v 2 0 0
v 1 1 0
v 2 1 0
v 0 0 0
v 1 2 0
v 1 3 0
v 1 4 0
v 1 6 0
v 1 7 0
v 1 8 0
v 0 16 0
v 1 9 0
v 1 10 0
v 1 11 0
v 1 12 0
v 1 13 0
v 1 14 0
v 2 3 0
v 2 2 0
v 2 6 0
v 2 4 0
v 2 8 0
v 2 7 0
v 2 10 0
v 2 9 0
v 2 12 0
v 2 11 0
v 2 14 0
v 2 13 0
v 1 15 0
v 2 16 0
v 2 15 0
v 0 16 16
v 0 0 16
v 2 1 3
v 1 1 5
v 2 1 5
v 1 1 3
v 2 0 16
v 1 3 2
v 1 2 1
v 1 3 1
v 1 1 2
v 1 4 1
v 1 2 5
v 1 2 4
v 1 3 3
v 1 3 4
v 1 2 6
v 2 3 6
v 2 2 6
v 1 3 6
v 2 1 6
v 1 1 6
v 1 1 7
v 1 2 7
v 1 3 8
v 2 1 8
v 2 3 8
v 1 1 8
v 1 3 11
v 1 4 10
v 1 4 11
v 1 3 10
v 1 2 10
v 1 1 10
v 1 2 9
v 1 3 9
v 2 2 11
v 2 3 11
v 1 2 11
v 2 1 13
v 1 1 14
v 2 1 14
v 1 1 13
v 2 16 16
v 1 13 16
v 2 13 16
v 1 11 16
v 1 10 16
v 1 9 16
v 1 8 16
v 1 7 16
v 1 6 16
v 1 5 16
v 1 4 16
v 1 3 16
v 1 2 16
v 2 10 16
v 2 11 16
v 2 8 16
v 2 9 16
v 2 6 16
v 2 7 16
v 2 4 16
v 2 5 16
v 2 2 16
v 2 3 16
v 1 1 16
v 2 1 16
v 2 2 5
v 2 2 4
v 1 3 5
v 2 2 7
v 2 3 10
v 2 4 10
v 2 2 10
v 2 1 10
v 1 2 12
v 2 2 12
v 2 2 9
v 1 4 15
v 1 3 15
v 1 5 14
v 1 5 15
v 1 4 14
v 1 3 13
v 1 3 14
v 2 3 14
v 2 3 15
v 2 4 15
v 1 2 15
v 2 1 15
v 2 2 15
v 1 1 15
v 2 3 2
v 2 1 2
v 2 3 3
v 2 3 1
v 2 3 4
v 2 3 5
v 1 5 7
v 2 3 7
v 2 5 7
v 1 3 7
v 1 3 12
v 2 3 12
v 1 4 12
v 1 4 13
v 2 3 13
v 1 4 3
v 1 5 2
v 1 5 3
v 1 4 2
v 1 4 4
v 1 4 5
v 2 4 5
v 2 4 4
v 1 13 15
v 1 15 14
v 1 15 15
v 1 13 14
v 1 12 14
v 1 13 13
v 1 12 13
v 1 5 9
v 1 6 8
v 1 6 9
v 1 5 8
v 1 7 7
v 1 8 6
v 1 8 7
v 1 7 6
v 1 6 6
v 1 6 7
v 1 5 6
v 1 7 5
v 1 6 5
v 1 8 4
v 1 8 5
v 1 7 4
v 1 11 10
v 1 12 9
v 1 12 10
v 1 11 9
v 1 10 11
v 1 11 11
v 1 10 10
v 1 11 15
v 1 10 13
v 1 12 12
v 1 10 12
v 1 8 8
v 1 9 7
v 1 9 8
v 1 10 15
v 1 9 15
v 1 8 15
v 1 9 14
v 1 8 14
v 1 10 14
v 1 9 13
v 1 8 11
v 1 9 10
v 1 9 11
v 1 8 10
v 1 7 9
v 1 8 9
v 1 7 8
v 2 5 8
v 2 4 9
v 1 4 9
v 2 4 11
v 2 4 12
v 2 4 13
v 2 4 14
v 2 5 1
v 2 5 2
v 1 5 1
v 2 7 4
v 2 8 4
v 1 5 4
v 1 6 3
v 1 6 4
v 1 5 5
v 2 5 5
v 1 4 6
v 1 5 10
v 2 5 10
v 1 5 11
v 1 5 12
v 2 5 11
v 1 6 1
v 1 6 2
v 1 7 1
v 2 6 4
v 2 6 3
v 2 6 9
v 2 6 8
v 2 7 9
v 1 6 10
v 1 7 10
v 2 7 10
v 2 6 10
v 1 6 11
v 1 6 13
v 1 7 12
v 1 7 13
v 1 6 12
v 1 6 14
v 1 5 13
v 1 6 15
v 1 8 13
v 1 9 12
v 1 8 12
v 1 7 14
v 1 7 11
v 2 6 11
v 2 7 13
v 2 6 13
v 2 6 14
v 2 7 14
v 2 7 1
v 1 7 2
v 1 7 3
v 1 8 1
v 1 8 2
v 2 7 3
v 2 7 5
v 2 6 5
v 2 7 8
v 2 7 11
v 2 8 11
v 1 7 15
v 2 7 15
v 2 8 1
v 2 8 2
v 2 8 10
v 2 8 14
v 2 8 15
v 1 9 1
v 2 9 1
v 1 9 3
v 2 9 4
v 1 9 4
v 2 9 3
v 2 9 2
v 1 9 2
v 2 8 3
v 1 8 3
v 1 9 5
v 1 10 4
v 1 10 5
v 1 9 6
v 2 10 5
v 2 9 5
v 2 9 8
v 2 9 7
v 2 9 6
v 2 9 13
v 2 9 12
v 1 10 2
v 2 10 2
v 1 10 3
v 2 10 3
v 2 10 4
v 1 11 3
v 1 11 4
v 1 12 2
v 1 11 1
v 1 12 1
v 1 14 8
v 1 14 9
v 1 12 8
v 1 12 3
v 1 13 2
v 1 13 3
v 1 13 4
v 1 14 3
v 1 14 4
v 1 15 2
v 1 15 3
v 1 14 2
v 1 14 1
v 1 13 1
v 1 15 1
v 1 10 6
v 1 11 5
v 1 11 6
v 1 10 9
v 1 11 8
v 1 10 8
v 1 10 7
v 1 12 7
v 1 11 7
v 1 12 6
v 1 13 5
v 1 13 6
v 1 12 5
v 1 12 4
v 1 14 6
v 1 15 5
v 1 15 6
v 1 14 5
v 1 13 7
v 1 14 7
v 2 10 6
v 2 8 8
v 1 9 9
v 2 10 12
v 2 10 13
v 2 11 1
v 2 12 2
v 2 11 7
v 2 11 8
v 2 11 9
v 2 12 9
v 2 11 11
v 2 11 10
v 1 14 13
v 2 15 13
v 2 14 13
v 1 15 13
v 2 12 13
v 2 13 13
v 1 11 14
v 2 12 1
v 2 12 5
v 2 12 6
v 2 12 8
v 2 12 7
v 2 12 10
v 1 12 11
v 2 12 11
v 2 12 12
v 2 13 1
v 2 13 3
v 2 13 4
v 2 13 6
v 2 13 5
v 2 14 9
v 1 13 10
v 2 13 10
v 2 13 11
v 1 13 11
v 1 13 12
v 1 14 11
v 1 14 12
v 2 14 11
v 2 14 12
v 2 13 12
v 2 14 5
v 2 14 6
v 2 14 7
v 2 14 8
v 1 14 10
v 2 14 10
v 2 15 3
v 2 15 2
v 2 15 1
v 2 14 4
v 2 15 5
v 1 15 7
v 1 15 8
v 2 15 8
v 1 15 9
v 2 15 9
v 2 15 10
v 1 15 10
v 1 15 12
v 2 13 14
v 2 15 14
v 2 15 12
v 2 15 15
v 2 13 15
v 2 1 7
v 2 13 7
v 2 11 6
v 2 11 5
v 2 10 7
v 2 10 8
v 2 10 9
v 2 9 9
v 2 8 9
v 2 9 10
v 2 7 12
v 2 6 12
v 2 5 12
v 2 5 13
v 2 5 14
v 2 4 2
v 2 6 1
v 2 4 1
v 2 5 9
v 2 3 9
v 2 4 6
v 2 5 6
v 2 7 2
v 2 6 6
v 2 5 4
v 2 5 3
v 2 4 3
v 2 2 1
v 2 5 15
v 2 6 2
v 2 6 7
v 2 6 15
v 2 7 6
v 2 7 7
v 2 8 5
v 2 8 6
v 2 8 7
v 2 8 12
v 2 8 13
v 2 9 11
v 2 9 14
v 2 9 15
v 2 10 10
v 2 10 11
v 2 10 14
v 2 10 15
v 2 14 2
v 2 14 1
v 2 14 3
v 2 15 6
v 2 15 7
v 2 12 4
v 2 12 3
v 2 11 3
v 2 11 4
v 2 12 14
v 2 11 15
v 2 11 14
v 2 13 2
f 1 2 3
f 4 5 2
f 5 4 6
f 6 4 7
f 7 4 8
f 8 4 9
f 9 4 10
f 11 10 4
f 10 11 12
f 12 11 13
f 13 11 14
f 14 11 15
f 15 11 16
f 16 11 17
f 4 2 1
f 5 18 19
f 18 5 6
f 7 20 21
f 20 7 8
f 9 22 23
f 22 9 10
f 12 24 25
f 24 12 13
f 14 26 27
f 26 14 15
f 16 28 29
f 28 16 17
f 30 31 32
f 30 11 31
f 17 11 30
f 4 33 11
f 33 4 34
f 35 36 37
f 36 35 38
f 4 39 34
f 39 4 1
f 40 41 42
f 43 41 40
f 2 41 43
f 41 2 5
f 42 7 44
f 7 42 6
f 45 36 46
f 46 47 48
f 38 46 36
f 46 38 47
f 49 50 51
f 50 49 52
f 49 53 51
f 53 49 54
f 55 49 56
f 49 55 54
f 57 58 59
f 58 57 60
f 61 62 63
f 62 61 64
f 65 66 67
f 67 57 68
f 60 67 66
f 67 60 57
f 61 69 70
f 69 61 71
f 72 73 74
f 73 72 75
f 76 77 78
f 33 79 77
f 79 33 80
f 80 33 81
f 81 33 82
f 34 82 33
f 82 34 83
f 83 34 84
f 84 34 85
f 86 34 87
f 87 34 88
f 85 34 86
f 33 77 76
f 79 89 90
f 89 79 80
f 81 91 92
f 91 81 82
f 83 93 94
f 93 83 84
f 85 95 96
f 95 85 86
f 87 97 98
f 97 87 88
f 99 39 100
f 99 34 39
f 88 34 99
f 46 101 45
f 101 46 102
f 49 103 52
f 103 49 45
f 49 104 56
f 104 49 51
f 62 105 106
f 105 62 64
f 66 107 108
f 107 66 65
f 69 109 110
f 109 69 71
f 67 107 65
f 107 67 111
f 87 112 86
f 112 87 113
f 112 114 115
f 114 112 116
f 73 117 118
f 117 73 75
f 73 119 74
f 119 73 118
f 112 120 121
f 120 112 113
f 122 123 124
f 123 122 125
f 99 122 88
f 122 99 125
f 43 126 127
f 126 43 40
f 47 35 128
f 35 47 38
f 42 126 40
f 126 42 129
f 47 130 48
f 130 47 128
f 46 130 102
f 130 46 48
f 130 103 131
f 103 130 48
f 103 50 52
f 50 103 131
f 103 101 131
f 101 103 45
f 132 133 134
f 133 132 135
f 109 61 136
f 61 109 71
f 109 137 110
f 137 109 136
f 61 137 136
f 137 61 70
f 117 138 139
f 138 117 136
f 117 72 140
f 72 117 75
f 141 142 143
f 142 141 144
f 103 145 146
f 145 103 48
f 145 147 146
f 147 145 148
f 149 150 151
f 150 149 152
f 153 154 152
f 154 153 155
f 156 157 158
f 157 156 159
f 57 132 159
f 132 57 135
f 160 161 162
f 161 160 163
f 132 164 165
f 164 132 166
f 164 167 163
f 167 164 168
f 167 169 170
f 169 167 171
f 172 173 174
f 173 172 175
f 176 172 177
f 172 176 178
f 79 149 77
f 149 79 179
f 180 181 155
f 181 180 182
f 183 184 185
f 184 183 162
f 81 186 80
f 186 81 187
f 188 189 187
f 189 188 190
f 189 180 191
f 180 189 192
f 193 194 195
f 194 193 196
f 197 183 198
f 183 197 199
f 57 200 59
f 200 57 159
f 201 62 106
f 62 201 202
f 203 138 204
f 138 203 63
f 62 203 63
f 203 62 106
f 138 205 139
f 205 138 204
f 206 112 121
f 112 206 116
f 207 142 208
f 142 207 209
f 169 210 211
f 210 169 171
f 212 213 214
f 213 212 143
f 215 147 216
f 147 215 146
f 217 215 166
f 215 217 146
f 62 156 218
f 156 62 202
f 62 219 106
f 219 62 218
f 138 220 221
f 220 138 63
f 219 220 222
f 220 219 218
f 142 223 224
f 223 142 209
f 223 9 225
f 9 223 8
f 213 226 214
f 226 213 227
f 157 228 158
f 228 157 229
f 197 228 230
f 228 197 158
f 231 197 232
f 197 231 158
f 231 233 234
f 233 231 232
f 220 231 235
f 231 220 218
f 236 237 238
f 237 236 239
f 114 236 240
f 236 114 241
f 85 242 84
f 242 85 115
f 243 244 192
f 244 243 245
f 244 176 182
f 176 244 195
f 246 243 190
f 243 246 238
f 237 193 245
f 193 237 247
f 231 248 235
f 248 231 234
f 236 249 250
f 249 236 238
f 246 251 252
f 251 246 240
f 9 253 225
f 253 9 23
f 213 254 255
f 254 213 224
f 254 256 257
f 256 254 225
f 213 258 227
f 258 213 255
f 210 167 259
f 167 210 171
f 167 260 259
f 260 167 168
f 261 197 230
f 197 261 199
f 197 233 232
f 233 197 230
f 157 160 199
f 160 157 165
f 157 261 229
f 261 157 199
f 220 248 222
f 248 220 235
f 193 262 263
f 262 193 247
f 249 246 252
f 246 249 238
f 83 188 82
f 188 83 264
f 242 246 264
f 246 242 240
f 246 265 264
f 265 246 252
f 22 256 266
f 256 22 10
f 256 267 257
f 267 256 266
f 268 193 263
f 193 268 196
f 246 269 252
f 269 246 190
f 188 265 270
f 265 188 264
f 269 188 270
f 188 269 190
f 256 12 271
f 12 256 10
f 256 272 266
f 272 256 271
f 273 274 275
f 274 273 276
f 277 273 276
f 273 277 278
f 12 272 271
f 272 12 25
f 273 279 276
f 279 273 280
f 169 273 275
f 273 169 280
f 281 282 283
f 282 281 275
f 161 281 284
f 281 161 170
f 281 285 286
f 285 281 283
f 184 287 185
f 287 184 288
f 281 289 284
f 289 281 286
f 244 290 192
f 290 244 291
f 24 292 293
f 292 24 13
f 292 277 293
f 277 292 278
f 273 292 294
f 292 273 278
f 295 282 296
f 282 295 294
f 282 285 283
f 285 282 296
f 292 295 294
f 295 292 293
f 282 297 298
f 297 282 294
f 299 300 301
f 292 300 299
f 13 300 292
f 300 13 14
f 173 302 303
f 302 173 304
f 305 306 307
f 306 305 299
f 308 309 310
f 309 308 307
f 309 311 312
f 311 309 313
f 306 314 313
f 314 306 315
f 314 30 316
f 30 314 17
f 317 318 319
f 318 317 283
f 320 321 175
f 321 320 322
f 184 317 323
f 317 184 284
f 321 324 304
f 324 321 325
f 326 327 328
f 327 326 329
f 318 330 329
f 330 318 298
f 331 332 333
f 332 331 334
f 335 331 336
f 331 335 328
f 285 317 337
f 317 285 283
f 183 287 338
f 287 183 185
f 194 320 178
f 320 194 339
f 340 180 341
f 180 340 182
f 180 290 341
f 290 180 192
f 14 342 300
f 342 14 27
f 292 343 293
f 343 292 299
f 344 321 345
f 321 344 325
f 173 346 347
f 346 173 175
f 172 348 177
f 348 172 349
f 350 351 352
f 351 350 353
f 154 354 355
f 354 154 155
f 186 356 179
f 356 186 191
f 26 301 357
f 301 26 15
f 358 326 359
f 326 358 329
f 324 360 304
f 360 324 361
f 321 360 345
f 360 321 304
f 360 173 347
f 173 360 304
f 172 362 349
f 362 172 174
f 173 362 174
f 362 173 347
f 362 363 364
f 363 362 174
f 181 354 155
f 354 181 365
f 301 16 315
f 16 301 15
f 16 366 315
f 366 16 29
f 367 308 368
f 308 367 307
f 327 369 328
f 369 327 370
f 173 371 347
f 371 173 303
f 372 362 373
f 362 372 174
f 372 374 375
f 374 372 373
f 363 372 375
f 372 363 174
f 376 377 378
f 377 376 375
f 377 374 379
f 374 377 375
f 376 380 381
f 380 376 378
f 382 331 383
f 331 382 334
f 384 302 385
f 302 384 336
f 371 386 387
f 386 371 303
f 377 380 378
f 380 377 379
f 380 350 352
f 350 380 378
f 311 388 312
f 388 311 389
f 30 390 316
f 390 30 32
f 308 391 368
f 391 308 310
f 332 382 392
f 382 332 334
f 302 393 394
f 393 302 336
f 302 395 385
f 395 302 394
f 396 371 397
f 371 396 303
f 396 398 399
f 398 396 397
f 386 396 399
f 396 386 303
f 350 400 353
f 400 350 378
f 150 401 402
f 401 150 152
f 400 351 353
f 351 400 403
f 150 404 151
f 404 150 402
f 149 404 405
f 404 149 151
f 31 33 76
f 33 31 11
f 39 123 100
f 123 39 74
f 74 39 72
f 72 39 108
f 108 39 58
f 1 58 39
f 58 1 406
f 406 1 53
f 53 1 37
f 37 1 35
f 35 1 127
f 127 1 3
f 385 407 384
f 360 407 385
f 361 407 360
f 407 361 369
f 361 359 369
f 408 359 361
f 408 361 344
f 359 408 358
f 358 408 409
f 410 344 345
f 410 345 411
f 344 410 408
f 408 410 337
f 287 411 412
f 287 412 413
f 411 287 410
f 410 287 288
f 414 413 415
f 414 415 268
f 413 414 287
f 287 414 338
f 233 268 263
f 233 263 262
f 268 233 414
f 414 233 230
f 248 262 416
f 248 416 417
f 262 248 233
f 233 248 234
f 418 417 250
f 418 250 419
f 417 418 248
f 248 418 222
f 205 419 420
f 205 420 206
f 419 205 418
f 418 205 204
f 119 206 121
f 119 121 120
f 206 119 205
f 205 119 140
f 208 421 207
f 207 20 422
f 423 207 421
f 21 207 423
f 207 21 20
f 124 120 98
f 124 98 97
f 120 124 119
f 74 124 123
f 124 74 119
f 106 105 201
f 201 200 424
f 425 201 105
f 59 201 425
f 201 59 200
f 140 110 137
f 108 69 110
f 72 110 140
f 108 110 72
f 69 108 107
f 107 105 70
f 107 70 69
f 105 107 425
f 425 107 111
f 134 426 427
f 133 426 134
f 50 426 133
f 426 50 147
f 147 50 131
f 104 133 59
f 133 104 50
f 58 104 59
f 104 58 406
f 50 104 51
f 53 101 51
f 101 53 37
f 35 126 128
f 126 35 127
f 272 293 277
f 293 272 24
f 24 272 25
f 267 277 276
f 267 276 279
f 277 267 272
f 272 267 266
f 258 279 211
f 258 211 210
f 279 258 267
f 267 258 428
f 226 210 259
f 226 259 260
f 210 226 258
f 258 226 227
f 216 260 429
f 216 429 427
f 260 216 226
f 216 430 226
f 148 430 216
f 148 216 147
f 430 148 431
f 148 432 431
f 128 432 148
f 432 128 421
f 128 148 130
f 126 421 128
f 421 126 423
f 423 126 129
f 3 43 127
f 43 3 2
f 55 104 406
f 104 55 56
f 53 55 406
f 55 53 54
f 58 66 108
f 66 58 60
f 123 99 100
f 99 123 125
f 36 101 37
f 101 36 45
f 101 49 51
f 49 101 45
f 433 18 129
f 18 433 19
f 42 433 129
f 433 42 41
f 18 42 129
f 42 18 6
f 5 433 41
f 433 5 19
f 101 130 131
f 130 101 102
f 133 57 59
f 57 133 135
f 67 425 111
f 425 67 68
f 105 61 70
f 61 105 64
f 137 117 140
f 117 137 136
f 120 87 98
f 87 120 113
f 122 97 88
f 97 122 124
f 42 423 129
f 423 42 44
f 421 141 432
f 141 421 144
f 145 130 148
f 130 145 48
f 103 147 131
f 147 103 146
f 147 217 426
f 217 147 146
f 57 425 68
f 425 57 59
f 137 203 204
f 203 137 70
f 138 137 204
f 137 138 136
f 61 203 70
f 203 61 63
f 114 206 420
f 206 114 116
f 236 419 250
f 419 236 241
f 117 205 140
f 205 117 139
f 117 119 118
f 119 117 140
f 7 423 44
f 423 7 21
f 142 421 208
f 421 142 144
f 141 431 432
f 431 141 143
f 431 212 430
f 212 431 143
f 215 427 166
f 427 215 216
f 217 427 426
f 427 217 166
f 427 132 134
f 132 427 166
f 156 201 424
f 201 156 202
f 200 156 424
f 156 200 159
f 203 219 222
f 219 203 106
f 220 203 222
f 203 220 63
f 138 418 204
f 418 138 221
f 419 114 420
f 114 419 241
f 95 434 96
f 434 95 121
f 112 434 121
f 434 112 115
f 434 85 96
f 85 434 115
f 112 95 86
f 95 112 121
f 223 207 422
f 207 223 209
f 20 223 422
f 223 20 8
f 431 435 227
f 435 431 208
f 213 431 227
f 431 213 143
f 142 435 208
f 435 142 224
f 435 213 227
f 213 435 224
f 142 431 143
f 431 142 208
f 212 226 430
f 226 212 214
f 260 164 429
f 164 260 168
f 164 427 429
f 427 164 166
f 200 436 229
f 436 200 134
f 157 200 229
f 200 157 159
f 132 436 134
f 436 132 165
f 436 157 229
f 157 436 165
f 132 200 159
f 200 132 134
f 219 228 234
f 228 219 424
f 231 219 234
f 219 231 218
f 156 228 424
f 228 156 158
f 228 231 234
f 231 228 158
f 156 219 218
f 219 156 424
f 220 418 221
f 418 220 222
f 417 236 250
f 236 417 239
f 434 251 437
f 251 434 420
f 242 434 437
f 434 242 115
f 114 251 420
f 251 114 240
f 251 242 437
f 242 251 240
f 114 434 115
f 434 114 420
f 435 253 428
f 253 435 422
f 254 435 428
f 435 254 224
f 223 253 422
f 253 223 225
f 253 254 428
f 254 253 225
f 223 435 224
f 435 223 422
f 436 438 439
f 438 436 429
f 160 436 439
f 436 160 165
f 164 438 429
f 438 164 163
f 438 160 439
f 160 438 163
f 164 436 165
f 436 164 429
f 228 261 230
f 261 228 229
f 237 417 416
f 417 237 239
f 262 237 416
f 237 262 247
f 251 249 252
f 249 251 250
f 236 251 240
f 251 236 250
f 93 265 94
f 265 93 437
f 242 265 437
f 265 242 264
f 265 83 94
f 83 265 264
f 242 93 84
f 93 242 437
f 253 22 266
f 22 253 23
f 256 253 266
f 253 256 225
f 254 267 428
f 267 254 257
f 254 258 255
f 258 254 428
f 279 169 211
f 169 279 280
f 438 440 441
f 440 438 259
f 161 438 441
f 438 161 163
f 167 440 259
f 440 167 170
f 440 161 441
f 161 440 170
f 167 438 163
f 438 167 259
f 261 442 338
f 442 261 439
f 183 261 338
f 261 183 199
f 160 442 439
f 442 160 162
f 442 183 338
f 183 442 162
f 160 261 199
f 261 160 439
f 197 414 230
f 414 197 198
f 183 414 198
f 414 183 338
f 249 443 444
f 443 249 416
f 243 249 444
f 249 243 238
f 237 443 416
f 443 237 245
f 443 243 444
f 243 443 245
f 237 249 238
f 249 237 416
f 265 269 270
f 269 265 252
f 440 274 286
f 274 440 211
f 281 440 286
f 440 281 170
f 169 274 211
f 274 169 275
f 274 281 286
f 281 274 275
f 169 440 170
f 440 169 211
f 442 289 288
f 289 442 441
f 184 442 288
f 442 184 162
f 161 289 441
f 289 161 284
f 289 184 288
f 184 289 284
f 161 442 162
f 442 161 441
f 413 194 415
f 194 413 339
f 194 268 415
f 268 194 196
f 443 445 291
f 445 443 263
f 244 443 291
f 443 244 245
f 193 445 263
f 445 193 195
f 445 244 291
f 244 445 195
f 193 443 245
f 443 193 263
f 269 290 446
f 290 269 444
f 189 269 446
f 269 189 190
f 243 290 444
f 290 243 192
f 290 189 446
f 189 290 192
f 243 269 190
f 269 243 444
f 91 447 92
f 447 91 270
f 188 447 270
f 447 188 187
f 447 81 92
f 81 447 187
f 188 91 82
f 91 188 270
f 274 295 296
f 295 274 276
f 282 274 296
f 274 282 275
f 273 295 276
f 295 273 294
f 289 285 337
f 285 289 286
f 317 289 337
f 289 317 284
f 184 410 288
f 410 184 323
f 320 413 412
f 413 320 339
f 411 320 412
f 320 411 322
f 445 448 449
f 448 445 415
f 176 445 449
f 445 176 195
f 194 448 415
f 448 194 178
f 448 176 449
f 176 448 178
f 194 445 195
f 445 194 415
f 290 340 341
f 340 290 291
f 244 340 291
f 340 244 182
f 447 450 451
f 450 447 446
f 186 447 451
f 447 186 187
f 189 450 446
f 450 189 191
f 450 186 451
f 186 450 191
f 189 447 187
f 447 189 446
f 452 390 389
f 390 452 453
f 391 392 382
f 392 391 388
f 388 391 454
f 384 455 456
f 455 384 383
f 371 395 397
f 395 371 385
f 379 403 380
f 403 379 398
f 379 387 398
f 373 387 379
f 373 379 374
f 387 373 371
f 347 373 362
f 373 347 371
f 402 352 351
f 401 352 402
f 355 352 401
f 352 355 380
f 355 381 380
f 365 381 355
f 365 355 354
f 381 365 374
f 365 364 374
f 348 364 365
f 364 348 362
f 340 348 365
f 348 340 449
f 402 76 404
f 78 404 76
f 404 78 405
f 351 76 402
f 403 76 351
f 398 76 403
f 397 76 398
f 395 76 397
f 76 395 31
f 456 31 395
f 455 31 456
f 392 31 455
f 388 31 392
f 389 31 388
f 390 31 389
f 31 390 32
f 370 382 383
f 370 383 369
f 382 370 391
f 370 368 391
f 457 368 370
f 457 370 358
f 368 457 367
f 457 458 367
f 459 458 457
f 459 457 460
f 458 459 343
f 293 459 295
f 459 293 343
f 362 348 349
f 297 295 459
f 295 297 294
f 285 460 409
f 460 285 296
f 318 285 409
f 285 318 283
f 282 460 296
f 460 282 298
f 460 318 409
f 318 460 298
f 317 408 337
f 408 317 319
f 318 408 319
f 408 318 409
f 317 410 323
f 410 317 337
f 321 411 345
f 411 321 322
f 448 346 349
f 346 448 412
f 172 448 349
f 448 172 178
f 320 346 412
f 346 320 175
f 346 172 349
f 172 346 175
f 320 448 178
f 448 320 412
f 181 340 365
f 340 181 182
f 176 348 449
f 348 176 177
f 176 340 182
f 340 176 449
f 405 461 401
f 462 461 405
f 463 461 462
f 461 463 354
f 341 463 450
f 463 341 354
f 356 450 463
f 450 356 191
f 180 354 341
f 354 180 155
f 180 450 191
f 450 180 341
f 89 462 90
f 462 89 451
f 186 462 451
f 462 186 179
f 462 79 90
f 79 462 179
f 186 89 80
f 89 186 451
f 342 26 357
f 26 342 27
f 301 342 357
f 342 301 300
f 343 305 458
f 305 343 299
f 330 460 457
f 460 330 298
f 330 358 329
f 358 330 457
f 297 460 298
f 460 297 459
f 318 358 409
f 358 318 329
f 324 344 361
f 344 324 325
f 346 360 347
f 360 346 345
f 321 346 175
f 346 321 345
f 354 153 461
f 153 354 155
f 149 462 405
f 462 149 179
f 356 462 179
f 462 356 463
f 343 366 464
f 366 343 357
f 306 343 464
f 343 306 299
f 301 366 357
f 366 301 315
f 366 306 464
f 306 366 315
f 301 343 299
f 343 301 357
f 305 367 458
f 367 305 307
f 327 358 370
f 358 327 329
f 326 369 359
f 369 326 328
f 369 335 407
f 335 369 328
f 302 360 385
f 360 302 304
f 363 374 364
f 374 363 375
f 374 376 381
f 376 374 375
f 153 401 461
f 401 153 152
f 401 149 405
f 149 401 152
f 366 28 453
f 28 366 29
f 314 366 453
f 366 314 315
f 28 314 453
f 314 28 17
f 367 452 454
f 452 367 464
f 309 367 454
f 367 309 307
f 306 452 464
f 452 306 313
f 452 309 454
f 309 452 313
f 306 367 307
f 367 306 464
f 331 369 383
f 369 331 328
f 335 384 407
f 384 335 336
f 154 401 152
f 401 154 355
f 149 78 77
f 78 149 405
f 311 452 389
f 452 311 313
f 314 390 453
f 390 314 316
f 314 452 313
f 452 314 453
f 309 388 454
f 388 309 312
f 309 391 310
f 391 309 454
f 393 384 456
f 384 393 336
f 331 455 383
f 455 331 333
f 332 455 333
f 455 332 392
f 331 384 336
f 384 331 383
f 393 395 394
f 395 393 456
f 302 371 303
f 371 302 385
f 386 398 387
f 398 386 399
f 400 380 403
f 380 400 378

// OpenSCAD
union() {
    translate([0, 0, 0]) cube([1, 1, 1]);
    translate([0, 0, 1]) cube([1, 1, 1]);
    translate([0, 0, 2]) cube([1, 1, 1]);
    translate([0, 0, 3]) cube([1, 1, 1]);
    translate([0, 0, 4]) cube([1, 1, 1]);
    translate([0, 0, 5]) cube([1, 1, 1]);
    translate([0, 0, 6]) cube([1, 1, 1]);
    translate([0, 0, 7]) cube([1, 1, 1]);
    translate([0, 0, 8]) cube([1, 1, 1]);
    translate([0, 0, 9]) cube([1, 1, 1]);
    translate([0, 0, 10]) cube([1, 1, 1]);
    translate([0, 0, 11]) cube([1, 1, 1]);
    translate([0, 0, 12]) cube([1, 1, 1]);
    translate([0, 0, 13]) cube([1, 1, 1]);
    translate([0, 0, 14]) cube([1, 1, 1]);
    translate([0, 0, 15]) cube([1, 1, 1]);
    translate([0, 1, 0]) cube([1, 1, 1]);
    translate([0, 1, 1]) cube([1, 1, 1]);
    translate([0, 1, 2]) cube([1, 1, 1]);
    translate([0, 1, 3]) cube([1, 1, 1]);
    translate([0, 1, 4]) cube([1, 1, 1]);
    translate([0, 1, 5]) cube([1, 1, 1]);
    translate([0, 1, 6]) cube([1, 1, 1]);
    translate([0, 1, 7]) cube([1, 1, 1]);
    translate([0, 1, 8]) cube([1, 1, 1]);
    translate([0, 1, 9]) cube([1, 1, 1]);
    translate([0, 1, 10]) cube([1, 1, 1]);
    translate([0, 1, 11]) cube([1, 1, 1]);
    translate([0, 1, 12]) cube([1, 1, 1]);
    translate([0, 1, 13]) cube([1, 1, 1]);
    translate([0, 1, 14]) cube([1, 1, 1]);
    translate([0, 1, 15]) cube([1, 1, 1]);
    translate([0, 2, 0]) cube([1, 1, 1]);
    translate([0, 2, 1]) cube([1, 1, 1]);
    translate([0, 2, 2]) cube([1, 1, 1]);
    translate([0, 2, 3]) cube([1, 1, 1]);
    translate([0, 2, 4]) cube([1, 1, 1]);
    translate([0, 2, 5]) cube([1, 1, 1]);
    translate([0, 2, 6]) cube([1, 1, 1]);
    translate([0, 2, 7]) cube([1, 1, 1]);
    translate([0, 2, 8]) cube([1, 1, 1]);
    translate([0, 2, 9]) cube([1, 1, 1]);
    translate([0, 2, 10]) cube([1, 1, 1]);
    translate([0, 2, 11]) cube([1, 1, 1]);
    translate([0, 2, 12]) cube([1, 1, 1]);
    translate([0, 2, 13]) cube([1, 1, 1]);
    translate([0, 2, 14]) cube([1, 1, 1]);
    translate([0, 2, 15]) cube([1, 1, 1]);
    translate([0, 3, 0]) cube([1, 1, 1]);
    translate([0, 3, 1]) cube([1, 1, 1]);
    translate([0, 3, 2]) cube([1, 1, 1]);
    translate([0, 3, 3]) cube([1, 1, 1]);
    translate([0, 3, 4]) cube([1, 1, 1]);
    translate([0, 3, 5]) cube([1, 1, 1]);
    translate([0, 3, 6]) cube([1, 1, 1]);
    translate([0, 3, 7]) cube([1, 1, 1]);
    translate([0, 3, 8]) cube([1, 1, 1]);
    translate([0, 3, 9]) cube([1, 1, 1]);
    translate([0, 3, 10]) cube([1, 1, 1]);
    translate([0, 3, 11]) cube([1, 1, 1]);
    translate([0, 3, 12]) cube([1, 1, 1]);
    translate([0, 3, 13]) cube([1, 1, 1]);
    translate([0, 3, 14]) cube([1, 1, 1]);
    translate([0, 3, 15]) cube([1, 1, 1]);
    translate([0, 4, 0]) cube([1, 1, 1]);
    translate([0, 4, 1]) cube([1, 1, 1]);
    translate([0, 4, 2]) cube([1, 1, 1]);
    translate([0, 4, 3]) cube([1, 1, 1]);
    translate([0, 4, 4]) cube([1, 1, 1]);
    translate([0, 4, 5]) cube([1, 1, 1]);
    translate([0, 4, 6]) cube([1, 1, 1]);
    translate([0, 4, 7]) cube([1, 1, 1]);
    translate([0, 4, 8]) cube([1, 1, 1]);
    translate([0, 4, 9]) cube([1, 1, 1]);
    translate([0, 4, 10]) cube([1, 1, 1]);
    translate([0, 4, 11]) cube([1, 1, 1]);
    translate([0, 4, 12]) cube([1, 1, 1]);
    translate([0, 4, 13]) cube([1, 1, 1]);
    translate([0, 4, 14]) cube([1, 1, 1]);
    translate([0, 4, 15]) cube([1, 1, 1]);
    translate([0, 5, 0]) cube([1, 1, 1]);
    translate([0, 5, 1]) cube([1, 1, 1]);
    translate([0, 5, 2]) cube([1, 1, 1]);
    translate([0, 5, 3]) cube([1, 1, 1]);
    translate([0, 5, 4]) cube([1, 1, 1]);
    translate([0, 5, 5]) cube([1, 1, 1]);
    translate([0, 5, 6]) cube([1, 1, 1]);
    translate([0, 5, 7]) cube([1, 1, 1]);
    translate([0, 5, 8]) cube([1, 1, 1]);
    translate([0, 5, 9]) cube([1, 1, 1]);
    translate([0, 5, 10]) cube([1, 1, 1]);
    translate([0, 5, 11]) cube([1, 1, 1]);
    translate([0, 5, 12]) cube([1, 1, 1]);
    translate([0, 5, 13]) cube([1, 1, 1]);
    translate([0, 5, 14]) cube([1, 1, 1]);
    translate([0, 5, 15]) cube([1, 1, 1]);
    translate([0, 6, 0]) cube([1, 1, 1]);
    translate([0, 6, 1]) cube([1, 1, 1]);
    translate([0, 6, 2]) cube([1, 1, 1]);
    translate([0, 6, 3]) cube([1, 1, 1]);
    translate([0, 6, 4]) cube([1, 1, 1]);
    translate([0, 6, 5]) cube([1, 1, 1]);
    translate([0, 6, 6]) cube([1, 1, 1]);
    translate([0, 6, 7]) cube([1, 1, 1]);
    translate([0, 6, 8]) cube([1, 1, 1]);
    translate([0, 6, 9]) cube([1, 1, 1]);
    translate([0, 6, 10]) cube([1, 1, 1]);
    translate([0, 6, 11]) cube([1, 1, 1]);
    translate([0, 6, 12]) cube([1, 1, 1]);
    translate([0, 6, 13]) cube([1, 1, 1]);
    translate([0, 6, 14]) cube([1, 1, 1]);
    translate([0, 6, 15]) cube([1, 1, 1]);
    translate([0, 7, 0]) cube([1, 1, 1]);
    translate([0, 7, 1]) cube([1, 1, 1]);
    translate([0, 7, 2]) cube([1, 1, 1]);
    translate([0, 7, 3]) cube([1, 1, 1]);
    translate([0, 7, 4]) cube([1, 1, 1]);
    translate([0, 7, 5]) cube([1, 1, 1]);
    translate([0, 7, 6]) cube([1, 1, 1]);
    translate([0, 7, 7]) cube([1, 1, 1]);
    translate([0, 7, 8]) cube([1, 1, 1]);
    translate([0, 7, 9]) cube([1, 1, 1]);
    translate([0, 7, 10]) cube([1, 1, 1]);
    translate([0, 7, 11]) cube([1, 1, 1]);
    translate([0, 7, 12]) cube([1, 1, 1]);
    translate([0, 7, 13]) cube([1, 1, 1]);
    translate([0, 7, 14]) cube([1, 1, 1]);
    translate([0, 7, 15]) cube([1, 1, 1]);
    translate([0, 8, 0]) cube([1, 1, 1]);
    translate([0, 8, 1]) cube([1, 1, 1]);
    translate([0, 8, 2]) cube([1, 1, 1]);
    translate([0, 8, 3]) cube([1, 1, 1]);
    translate([0, 8, 4]) cube([1, 1, 1]);
    translate([0, 8, 5]) cube([1, 1, 1]);
    translate([0, 8, 6]) cube([1, 1, 1]);
    translate([0, 8, 7]) cube([1, 1, 1]);
    translate([0, 8, 8]) cube([1, 1, 1]);
    translate([0, 8, 9]) cube([1, 1, 1]);
    translate([0, 8, 10]) cube([1, 1, 1]);
    translate([0, 8, 11]) cube([1, 1, 1]);
    translate([0, 8, 12]) cube([1, 1, 1]);
    translate([0, 8, 13]) cube([1, 1, 1]);
    translate([0, 8, 14]) cube([1, 1, 1]);
    translate([0, 8, 15]) cube([1, 1, 1]);
    translate([0, 9, 0]) cube([1, 1, 1]);
    translate([0, 9, 1]) cube([1, 1, 1]);
    translate([0, 9, 2]) cube([1, 1, 1]);
    translate([0, 9, 3]) cube([1, 1, 1]);
    translate([0, 9, 4]) cube([1, 1, 1]);
    translate([0, 9, 5]) cube([1, 1, 1]);
    translate([0, 9, 6]) cube([1, 1, 1]);
    translate([0, 9, 7]) cube([1, 1, 1]);
    translate([0, 9, 8]) cube([1, 1, 1]);
    translate([0, 9, 9]) cube([1, 1, 1]);
    translate([0, 9, 10]) cube([1, 1, 1]);
    translate([0, 9, 11]) cube([1, 1, 1]);
    translate([0, 9, 12]) cube([1, 1, 1]);
    translate([0, 9, 13]) cube([1, 1, 1]);
    translate([0, 9, 14]) cube([1, 1, 1]);
    translate([0, 9, 15]) cube([1, 1, 1]);
    translate([0, 10, 0]) cube([1, 1, 1]);
    translate([0, 10, 1]) cube([1, 1, 1]);
    translate([0, 10, 2]) cube([1, 1, 1]);
    translate([0, 10, 3]) cube([1, 1, 1]);
    translate([0, 10, 4]) cube([1, 1, 1]);
    translate([0, 10, 5]) cube([1, 1, 1]);
    translate([0, 10, 6]) cube([1, 1, 1]);
    translate([0, 10, 7]) cube([1, 1, 1]);
    translate([0, 10, 8]) cube([1, 1, 1]);
    translate([0, 10, 9]) cube([1, 1, 1]);
    translate([0, 10, 10]) cube([1, 1, 1]);
    translate([0, 10, 11]) cube([1, 1, 1]);
    translate([0, 10, 12]) cube([1, 1, 1]);
    translate([0, 10, 13]) cube([1, 1, 1]);
    translate([0, 10, 14]) cube([1, 1, 1]);
    translate([0, 10, 15]) cube([1, 1, 1]);
    translate([0, 11, 0]) cube([1, 1, 1]);
    translate([0, 11, 1]) cube([1, 1, 1]);
    translate([0, 11, 2]) cube([1, 1, 1]);
    translate([0, 11, 3]) cube([1, 1, 1]);
    translate([0, 11, 4]) cube([1, 1, 1]);
    translate([0, 11, 5]) cube([1, 1, 1]);
    translate([0, 11, 6]) cube([1, 1, 1]);
    translate([0, 11, 7]) cube([1, 1, 1]);
    translate([0, 11, 8]) cube([1, 1, 1]);
    translate([0, 11, 9]) cube([1, 1, 1]);
    translate([0, 11, 10]) cube([1, 1, 1]);
    translate([0, 11, 11]) cube([1, 1, 1]);
    translate([0, 11, 12]) cube([1, 1, 1]);
    translate([0, 11, 13]) cube([1, 1, 1]);
    translate([0, 11, 14]) cube([1, 1, 1]);
    translate([0, 11, 15]) cube([1, 1, 1]);
    translate([0, 12, 0]) cube([1, 1, 1]);
    translate([0, 12, 1]) cube([1, 1, 1]);
    translate([0, 12, 2]) cube([1, 1, 1]);
    translate([0, 12, 3]) cube([1, 1, 1]);
    translate([0, 12, 4]) cube([1, 1, 1]);
    translate([0, 12, 5]) cube([1, 1, 1]);
    translate([0, 12, 6]) cube([1, 1, 1]);
    translate([0, 12, 7]) cube([1, 1, 1]);
    translate([0, 12, 8]) cube([1, 1, 1]);
    translate([0, 12, 9]) cube([1, 1, 1]);
    translate([0, 12, 10]) cube([1, 1, 1]);
    translate([0, 12, 11]) cube([1, 1, 1]);
    translate([0, 12, 12]) cube([1, 1, 1]);
    translate([0, 12, 13]) cube([1, 1, 1]);
    translate([0, 12, 14]) cube([1, 1, 1]);
    translate([0, 12, 15]) cube([1, 1, 1]);
    translate([0, 13, 0]) cube([1, 1, 1]);
    translate([0, 13, 1]) cube([1, 1, 1]);
    translate([0, 13, 2]) cube([1, 1, 1]);
    translate([0, 13, 3]) cube([1, 1, 1]);
    translate([0, 13, 4]) cube([1, 1, 1]);
    translate([0, 13, 5]) cube([1, 1, 1]);
    translate([0, 13, 6]) cube([1, 1, 1]);
    translate([0, 13, 7]) cube([1, 1, 1]);
    translate([0, 13, 8]) cube([1, 1, 1]);
    translate([0, 13, 9]) cube([1, 1, 1]);
    translate([0, 13, 10]) cube([1, 1, 1]);
    translate([0, 13, 11]) cube([1, 1, 1]);
    translate([0, 13, 12]) cube([1, 1, 1]);
    translate([0, 13, 13]) cube([1, 1, 1]);
    translate([0, 13, 14]) cube([1, 1, 1]);
    translate([0, 13, 15]) cube([1, 1, 1]);
    translate([0, 14, 0]) cube([1, 1, 1]);
    translate([0, 14, 1]) cube([1, 1, 1]);
    translate([0, 14, 2]) cube([1, 1, 1]);
    translate([0, 14, 3]) cube([1, 1, 1]);
    translate([0, 14, 4]) cube([1, 1, 1]);
    translate([0, 14, 5]) cube([1, 1, 1]);
    translate([0, 14, 6]) cube([1, 1, 1]);
    translate([0, 14, 7]) cube([1, 1, 1]);
    translate([0, 14, 8]) cube([1, 1, 1]);
    translate([0, 14, 9]) cube([1, 1, 1]);
    translate([0, 14, 10]) cube([1, 1, 1]);
    translate([0, 14, 11]) cube([1, 1, 1]);
    translate([0, 14, 12]) cube([1, 1, 1]);
    translate([0, 14, 13]) cube([1, 1, 1]);
    translate([0, 14, 14]) cube([1, 1, 1]);
    translate([0, 14, 15]) cube([1, 1, 1]);
    translate([0, 15, 0]) cube([1, 1, 1]);
    translate([0, 15, 1]) cube([1, 1, 1]);
    translate([0, 15, 2]) cube([1, 1, 1]);
    translate([0, 15, 3]) cube([1, 1, 1]);
    translate([0, 15, 4]) cube([1, 1, 1]);
    translate([0, 15, 5]) cube([1, 1, 1]);
    translate([0, 15, 6]) cube([1, 1, 1]);
    translate([0, 15, 7]) cube([1, 1, 1]);
    translate([0, 15, 8]) cube([1, 1, 1]);
    translate([0, 15, 9]) cube([1, 1, 1]);
    translate([0, 15, 10]) cube([1, 1, 1]);
    translate([0, 15, 11]) cube([1, 1, 1]);
    translate([0, 15, 12]) cube([1, 1, 1]);
    translate([0, 15, 13]) cube([1, 1, 1]);
    translate([0, 15, 14]) cube([1, 1, 1]);
    translate([0, 15, 15]) cube([1, 1, 1]);
    translate([1, 0, 0]) cube([1, 1, 1]);
    translate([1, 0, 1]) cube([1, 1, 1]);
    translate([1, 0, 2]) cube([1, 1, 1]);
    translate([1, 0, 3]) cube([1, 1, 1]);
    translate([1, 0, 4]) cube([1, 1, 1]);
    translate([1, 0, 5]) cube([1, 1, 1]);
    translate([1, 0, 6]) cube([1, 1, 1]);
    translate([1, 0, 7]) cube([1, 1, 1]);
    translate([1, 0, 8]) cube([1, 1, 1]);
    translate([1, 0, 9]) cube([1, 1, 1]);
    translate([1, 0, 10]) cube([1, 1, 1]);
    translate([1, 0, 11]) cube([1, 1, 1]);
    translate([1, 0, 12]) cube([1, 1, 1]);
    translate([1, 0, 13]) cube([1, 1, 1]);
    translate([1, 0, 14]) cube([1, 1, 1]);
    translate([1, 0, 15]) cube([1, 1, 1]);
    translate([1, 1, 2]) cube([1, 1, 1]);
    translate([1, 1, 5]) cube([1, 1, 1]);
    translate([1, 1, 7]) cube([1, 1, 1]);
    translate([1, 1, 10]) cube([1, 1, 1]);
    translate([1, 1, 11]) cube([1, 1, 1]);
    translate([1, 1, 12]) cube([1, 1, 1]);
    translate([1, 1, 14]) cube([1, 1, 1]);
    translate([1, 2, 0]) cube([1, 1, 1]);
    translate([1, 2, 2]) cube([1, 1, 1]);
    translate([1, 2, 4]) cube([1, 1, 1]);
    translate([1, 2, 6]) cube([1, 1, 1]);
    translate([1, 2, 7]) cube([1, 1, 1]);
    translate([1, 2, 9]) cube([1, 1, 1]);
    translate([1, 2, 10]) cube([1, 1, 1]);
    translate([1, 2, 12]) cube([1, 1, 1]);
    translate([1, 2, 14]) cube([1, 1, 1]);
    translate([1, 2, 15]) cube([1, 1, 1]);
    translate([1, 3, 1]) cube([1, 1, 1]);
    translate([1, 3, 2]) cube([1, 1, 1]);
    translate([1, 3, 3]) cube([1, 1, 1]);
    translate([1, 3, 5]) cube([1, 1, 1]);
    translate([1, 3, 6]) cube([1, 1, 1]);
    translate([1, 3, 8]) cube([1, 1, 1]);
    translate([1, 3, 9]) cube([1, 1, 1]);
    translate([1, 3, 11]) cube([1, 1, 1]);
    translate([1, 3, 13]) cube([1, 1, 1]);
    translate([1, 3, 14]) cube([1, 1, 1]);
    translate([1, 4, 0]) cube([1, 1, 1]);
    translate([1, 4, 1]) cube([1, 1, 1]);
    translate([1, 4, 3]) cube([1, 1, 1]);
    translate([1, 4, 4]) cube([1, 1, 1]);
    translate([1, 4, 6]) cube([1, 1, 1]);
    translate([1, 4, 8]) cube([1, 1, 1]);
    translate([1, 4, 10]) cube([1, 1, 1]);
    translate([1, 4, 12]) cube([1, 1, 1]);
    translate([1, 4, 13]) cube([1, 1, 1]);
    translate([1, 4, 15]) cube([1, 1, 1]);
    translate([1, 5, 0]) cube([1, 1, 1]);
    translate([1, 5, 2]) cube([1, 1, 1]);
    translate([1, 5, 4]) cube([1, 1, 1]);
    translate([1, 5, 5]) cube([1, 1, 1]);
    translate([1, 5, 7]) cube([1, 1, 1]);
    translate([1, 5, 9]) cube([1, 1, 1]);
    translate([1, 5, 11]) cube([1, 1, 1]);
    translate([1, 5, 12]) cube([1, 1, 1]);
    translate([1, 5, 14]) cube([1, 1, 1]);
    translate([1, 6, 1]) cube([1, 1, 1]);
    translate([1, 6, 3]) cube([1, 1, 1]);
    translate([1, 6, 4]) cube([1, 1, 1]);
    translate([1, 6, 6]) cube([1, 1, 1]);
    translate([1, 6, 8]) cube([1, 1, 1]);
    translate([1, 6, 10]) cube([1, 1, 1]);
    translate([1, 6, 11]) cube([1, 1, 1]);
    translate([1, 6, 13]) cube([1, 1, 1]);
    translate([1, 6, 15]) cube([1, 1, 1]);
    translate([1, 7, 0]) cube([1, 1, 1]);
    translate([1, 7, 2]) cube([1, 1, 1]);
    translate([1, 7, 3]) cube([1, 1, 1]);
    translate([1, 7, 5]) cube([1, 1, 1]);
    translate([1, 7, 7]) cube([1, 1, 1]);
    translate([1, 7, 9]) cube([1, 1, 1]);
    translate([1, 7, 10]) cube([1, 1, 1]);
    translate([1, 7, 12]) cube([1, 1, 1]);
    translate([1, 7, 14]) cube([1, 1, 1]);
    translate([1, 8, 1]) cube([1, 1, 1]);
    translate([1, 8, 2]) cube([1, 1, 1]);
    translate([1, 8, 4]) cube([1, 1, 1]);
    translate([1, 8, 6]) cube([1, 1, 1]);
    translate([1, 8, 8]) cube([1, 1, 1]);
    translate([1, 8, 9]) cube([1, 1, 1]);
    translate([1, 8, 11]) cube([1, 1, 1]);
    translate([1, 8, 13]) cube([1, 1, 1]);
    translate([1, 8, 15]) cube([1, 1, 1]);
    translate([1, 9, 0]) cube([1, 1, 1]);
    translate([1, 9, 1]) cube([1, 1, 1]);
    translate([1, 9, 3]) cube([1, 1, 1]);
    translate([1, 9, 5]) cube([1, 1, 1]);
    translate([1, 9, 7]) cube([1, 1, 1]);
    translate([1, 9, 8]) cube([1, 1, 1]);
    translate([1, 9, 10]) cube([1, 1, 1]);
    translate([1, 9, 12]) cube([1, 1, 1]);
    translate([1, 9, 14]) cube([1, 1, 1]);
    translate([1, 10, 2]) cube([1, 1, 1]);
    translate([1, 10, 4]) cube([1, 1, 1]);
    translate([1, 10, 6]) cube([1, 1, 1]);
    translate([1, 10, 7]) cube([1, 1, 1]);
    translate([1, 10, 9]) cube([1, 1, 1]);
    translate([1, 10, 11]) cube([1, 1, 1]);
    translate([1, 10, 13]) cube([1, 1, 1]);
    translate([1, 10, 15]) cube([1, 1, 1]);
    translate([1, 11, 0]) cube([1, 1, 1]);
    translate([1, 11, 2]) cube([1, 1, 1]);
    translate([1, 11, 3]) cube([1, 1, 1]);
    translate([1, 11, 5]) cube([1, 1, 1]);
    translate([1, 11, 6]) cube([1, 1, 1]);
    translate([1, 11, 8]) cube([1, 1, 1]);
    translate([1, 11, 10]) cube([1, 1, 1]);
    translate([1, 11, 11]) cube([1, 1, 1]);
    translate([1, 11, 13]) cube([1, 1, 1]);
    translate([1, 11, 14]) cube([1, 1, 1]);
    translate([1, 12, 1]) cube([1, 1, 1]);
    translate([1, 12, 3]) cube([1, 1, 1]);
    translate([1, 12, 4]) cube([1, 1, 1]);
    translate([1, 12, 6]) cube([1, 1, 1]);
    translate([1, 12, 7]) cube([1, 1, 1]);
    translate([1, 12, 9]) cube([1, 1, 1]);
    translate([1, 12, 11]) cube([1, 1, 1]);
    translate([1, 12, 12]) cube([1, 1, 1]);
    translate([1, 12, 14]) cube([1, 1, 1]);
    translate([1, 13, 0]) cube([1, 1, 1]);
    translate([1, 13, 2]) cube([1, 1, 1]);
    translate([1, 13, 4]) cube([1, 1, 1]);
    translate([1, 13, 5]) cube([1, 1, 1]);
    translate([1, 13, 7]) cube([1, 1, 1]);
    translate([1, 13, 9]) cube([1, 1, 1]);
    translate([1, 13, 10]) cube([1, 1, 1]);
    translate([1, 13, 12]) cube([1, 1, 1]);
    translate([1, 13, 13]) cube([1, 1, 1]);
    translate([1, 13, 15]) cube([1, 1, 1]);
    translate([1, 14, 1]) cube([1, 1, 1]);
    translate([1, 14, 3]) cube([1, 1, 1]);
    translate([1, 14, 4]) cube([1, 1, 1]);
    translate([1, 14, 6]) cube([1, 1, 1]);
    translate([1, 14, 8]) cube([1, 1, 1]);
    translate([1, 14, 10]) cube([1, 1, 1]);
    translate([1, 14, 11]) cube([1, 1, 1]);
    translate([1, 14, 13]) cube([1, 1, 1]);
    translate([1, 14, 15]) cube([1, 1, 1]);
    translate([1, 15, 0]) cube([1, 1, 1]);
    translate([1, 15, 1]) cube([1, 1, 1]);
    translate([1, 15, 2]) cube([1, 1, 1]);
    translate([1, 15, 3]) cube([1, 1, 1]);
    translate([1, 15, 4]) cube([1, 1, 1]);
    translate([1, 15, 5]) cube([1, 1, 1]);
    translate([1, 15, 6]) cube([1, 1, 1]);
    translate([1, 15, 7]) cube([1, 1, 1]);
    translate([1, 15, 8]) cube([1, 1, 1]);
    translate([1, 15, 9]) cube([1, 1, 1]);
    translate([1, 15, 10]) cube([1, 1, 1]);
    translate([1, 15, 11]) cube([1, 1, 1]);
    translate([1, 15, 12]) cube([1, 1, 1]);
    translate([1, 15, 13]) cube([1, 1, 1]);
    translate([1, 15, 14]) cube([1, 1, 1]);
    translate([1, 15, 15]) cube([1, 1, 1]);
}
